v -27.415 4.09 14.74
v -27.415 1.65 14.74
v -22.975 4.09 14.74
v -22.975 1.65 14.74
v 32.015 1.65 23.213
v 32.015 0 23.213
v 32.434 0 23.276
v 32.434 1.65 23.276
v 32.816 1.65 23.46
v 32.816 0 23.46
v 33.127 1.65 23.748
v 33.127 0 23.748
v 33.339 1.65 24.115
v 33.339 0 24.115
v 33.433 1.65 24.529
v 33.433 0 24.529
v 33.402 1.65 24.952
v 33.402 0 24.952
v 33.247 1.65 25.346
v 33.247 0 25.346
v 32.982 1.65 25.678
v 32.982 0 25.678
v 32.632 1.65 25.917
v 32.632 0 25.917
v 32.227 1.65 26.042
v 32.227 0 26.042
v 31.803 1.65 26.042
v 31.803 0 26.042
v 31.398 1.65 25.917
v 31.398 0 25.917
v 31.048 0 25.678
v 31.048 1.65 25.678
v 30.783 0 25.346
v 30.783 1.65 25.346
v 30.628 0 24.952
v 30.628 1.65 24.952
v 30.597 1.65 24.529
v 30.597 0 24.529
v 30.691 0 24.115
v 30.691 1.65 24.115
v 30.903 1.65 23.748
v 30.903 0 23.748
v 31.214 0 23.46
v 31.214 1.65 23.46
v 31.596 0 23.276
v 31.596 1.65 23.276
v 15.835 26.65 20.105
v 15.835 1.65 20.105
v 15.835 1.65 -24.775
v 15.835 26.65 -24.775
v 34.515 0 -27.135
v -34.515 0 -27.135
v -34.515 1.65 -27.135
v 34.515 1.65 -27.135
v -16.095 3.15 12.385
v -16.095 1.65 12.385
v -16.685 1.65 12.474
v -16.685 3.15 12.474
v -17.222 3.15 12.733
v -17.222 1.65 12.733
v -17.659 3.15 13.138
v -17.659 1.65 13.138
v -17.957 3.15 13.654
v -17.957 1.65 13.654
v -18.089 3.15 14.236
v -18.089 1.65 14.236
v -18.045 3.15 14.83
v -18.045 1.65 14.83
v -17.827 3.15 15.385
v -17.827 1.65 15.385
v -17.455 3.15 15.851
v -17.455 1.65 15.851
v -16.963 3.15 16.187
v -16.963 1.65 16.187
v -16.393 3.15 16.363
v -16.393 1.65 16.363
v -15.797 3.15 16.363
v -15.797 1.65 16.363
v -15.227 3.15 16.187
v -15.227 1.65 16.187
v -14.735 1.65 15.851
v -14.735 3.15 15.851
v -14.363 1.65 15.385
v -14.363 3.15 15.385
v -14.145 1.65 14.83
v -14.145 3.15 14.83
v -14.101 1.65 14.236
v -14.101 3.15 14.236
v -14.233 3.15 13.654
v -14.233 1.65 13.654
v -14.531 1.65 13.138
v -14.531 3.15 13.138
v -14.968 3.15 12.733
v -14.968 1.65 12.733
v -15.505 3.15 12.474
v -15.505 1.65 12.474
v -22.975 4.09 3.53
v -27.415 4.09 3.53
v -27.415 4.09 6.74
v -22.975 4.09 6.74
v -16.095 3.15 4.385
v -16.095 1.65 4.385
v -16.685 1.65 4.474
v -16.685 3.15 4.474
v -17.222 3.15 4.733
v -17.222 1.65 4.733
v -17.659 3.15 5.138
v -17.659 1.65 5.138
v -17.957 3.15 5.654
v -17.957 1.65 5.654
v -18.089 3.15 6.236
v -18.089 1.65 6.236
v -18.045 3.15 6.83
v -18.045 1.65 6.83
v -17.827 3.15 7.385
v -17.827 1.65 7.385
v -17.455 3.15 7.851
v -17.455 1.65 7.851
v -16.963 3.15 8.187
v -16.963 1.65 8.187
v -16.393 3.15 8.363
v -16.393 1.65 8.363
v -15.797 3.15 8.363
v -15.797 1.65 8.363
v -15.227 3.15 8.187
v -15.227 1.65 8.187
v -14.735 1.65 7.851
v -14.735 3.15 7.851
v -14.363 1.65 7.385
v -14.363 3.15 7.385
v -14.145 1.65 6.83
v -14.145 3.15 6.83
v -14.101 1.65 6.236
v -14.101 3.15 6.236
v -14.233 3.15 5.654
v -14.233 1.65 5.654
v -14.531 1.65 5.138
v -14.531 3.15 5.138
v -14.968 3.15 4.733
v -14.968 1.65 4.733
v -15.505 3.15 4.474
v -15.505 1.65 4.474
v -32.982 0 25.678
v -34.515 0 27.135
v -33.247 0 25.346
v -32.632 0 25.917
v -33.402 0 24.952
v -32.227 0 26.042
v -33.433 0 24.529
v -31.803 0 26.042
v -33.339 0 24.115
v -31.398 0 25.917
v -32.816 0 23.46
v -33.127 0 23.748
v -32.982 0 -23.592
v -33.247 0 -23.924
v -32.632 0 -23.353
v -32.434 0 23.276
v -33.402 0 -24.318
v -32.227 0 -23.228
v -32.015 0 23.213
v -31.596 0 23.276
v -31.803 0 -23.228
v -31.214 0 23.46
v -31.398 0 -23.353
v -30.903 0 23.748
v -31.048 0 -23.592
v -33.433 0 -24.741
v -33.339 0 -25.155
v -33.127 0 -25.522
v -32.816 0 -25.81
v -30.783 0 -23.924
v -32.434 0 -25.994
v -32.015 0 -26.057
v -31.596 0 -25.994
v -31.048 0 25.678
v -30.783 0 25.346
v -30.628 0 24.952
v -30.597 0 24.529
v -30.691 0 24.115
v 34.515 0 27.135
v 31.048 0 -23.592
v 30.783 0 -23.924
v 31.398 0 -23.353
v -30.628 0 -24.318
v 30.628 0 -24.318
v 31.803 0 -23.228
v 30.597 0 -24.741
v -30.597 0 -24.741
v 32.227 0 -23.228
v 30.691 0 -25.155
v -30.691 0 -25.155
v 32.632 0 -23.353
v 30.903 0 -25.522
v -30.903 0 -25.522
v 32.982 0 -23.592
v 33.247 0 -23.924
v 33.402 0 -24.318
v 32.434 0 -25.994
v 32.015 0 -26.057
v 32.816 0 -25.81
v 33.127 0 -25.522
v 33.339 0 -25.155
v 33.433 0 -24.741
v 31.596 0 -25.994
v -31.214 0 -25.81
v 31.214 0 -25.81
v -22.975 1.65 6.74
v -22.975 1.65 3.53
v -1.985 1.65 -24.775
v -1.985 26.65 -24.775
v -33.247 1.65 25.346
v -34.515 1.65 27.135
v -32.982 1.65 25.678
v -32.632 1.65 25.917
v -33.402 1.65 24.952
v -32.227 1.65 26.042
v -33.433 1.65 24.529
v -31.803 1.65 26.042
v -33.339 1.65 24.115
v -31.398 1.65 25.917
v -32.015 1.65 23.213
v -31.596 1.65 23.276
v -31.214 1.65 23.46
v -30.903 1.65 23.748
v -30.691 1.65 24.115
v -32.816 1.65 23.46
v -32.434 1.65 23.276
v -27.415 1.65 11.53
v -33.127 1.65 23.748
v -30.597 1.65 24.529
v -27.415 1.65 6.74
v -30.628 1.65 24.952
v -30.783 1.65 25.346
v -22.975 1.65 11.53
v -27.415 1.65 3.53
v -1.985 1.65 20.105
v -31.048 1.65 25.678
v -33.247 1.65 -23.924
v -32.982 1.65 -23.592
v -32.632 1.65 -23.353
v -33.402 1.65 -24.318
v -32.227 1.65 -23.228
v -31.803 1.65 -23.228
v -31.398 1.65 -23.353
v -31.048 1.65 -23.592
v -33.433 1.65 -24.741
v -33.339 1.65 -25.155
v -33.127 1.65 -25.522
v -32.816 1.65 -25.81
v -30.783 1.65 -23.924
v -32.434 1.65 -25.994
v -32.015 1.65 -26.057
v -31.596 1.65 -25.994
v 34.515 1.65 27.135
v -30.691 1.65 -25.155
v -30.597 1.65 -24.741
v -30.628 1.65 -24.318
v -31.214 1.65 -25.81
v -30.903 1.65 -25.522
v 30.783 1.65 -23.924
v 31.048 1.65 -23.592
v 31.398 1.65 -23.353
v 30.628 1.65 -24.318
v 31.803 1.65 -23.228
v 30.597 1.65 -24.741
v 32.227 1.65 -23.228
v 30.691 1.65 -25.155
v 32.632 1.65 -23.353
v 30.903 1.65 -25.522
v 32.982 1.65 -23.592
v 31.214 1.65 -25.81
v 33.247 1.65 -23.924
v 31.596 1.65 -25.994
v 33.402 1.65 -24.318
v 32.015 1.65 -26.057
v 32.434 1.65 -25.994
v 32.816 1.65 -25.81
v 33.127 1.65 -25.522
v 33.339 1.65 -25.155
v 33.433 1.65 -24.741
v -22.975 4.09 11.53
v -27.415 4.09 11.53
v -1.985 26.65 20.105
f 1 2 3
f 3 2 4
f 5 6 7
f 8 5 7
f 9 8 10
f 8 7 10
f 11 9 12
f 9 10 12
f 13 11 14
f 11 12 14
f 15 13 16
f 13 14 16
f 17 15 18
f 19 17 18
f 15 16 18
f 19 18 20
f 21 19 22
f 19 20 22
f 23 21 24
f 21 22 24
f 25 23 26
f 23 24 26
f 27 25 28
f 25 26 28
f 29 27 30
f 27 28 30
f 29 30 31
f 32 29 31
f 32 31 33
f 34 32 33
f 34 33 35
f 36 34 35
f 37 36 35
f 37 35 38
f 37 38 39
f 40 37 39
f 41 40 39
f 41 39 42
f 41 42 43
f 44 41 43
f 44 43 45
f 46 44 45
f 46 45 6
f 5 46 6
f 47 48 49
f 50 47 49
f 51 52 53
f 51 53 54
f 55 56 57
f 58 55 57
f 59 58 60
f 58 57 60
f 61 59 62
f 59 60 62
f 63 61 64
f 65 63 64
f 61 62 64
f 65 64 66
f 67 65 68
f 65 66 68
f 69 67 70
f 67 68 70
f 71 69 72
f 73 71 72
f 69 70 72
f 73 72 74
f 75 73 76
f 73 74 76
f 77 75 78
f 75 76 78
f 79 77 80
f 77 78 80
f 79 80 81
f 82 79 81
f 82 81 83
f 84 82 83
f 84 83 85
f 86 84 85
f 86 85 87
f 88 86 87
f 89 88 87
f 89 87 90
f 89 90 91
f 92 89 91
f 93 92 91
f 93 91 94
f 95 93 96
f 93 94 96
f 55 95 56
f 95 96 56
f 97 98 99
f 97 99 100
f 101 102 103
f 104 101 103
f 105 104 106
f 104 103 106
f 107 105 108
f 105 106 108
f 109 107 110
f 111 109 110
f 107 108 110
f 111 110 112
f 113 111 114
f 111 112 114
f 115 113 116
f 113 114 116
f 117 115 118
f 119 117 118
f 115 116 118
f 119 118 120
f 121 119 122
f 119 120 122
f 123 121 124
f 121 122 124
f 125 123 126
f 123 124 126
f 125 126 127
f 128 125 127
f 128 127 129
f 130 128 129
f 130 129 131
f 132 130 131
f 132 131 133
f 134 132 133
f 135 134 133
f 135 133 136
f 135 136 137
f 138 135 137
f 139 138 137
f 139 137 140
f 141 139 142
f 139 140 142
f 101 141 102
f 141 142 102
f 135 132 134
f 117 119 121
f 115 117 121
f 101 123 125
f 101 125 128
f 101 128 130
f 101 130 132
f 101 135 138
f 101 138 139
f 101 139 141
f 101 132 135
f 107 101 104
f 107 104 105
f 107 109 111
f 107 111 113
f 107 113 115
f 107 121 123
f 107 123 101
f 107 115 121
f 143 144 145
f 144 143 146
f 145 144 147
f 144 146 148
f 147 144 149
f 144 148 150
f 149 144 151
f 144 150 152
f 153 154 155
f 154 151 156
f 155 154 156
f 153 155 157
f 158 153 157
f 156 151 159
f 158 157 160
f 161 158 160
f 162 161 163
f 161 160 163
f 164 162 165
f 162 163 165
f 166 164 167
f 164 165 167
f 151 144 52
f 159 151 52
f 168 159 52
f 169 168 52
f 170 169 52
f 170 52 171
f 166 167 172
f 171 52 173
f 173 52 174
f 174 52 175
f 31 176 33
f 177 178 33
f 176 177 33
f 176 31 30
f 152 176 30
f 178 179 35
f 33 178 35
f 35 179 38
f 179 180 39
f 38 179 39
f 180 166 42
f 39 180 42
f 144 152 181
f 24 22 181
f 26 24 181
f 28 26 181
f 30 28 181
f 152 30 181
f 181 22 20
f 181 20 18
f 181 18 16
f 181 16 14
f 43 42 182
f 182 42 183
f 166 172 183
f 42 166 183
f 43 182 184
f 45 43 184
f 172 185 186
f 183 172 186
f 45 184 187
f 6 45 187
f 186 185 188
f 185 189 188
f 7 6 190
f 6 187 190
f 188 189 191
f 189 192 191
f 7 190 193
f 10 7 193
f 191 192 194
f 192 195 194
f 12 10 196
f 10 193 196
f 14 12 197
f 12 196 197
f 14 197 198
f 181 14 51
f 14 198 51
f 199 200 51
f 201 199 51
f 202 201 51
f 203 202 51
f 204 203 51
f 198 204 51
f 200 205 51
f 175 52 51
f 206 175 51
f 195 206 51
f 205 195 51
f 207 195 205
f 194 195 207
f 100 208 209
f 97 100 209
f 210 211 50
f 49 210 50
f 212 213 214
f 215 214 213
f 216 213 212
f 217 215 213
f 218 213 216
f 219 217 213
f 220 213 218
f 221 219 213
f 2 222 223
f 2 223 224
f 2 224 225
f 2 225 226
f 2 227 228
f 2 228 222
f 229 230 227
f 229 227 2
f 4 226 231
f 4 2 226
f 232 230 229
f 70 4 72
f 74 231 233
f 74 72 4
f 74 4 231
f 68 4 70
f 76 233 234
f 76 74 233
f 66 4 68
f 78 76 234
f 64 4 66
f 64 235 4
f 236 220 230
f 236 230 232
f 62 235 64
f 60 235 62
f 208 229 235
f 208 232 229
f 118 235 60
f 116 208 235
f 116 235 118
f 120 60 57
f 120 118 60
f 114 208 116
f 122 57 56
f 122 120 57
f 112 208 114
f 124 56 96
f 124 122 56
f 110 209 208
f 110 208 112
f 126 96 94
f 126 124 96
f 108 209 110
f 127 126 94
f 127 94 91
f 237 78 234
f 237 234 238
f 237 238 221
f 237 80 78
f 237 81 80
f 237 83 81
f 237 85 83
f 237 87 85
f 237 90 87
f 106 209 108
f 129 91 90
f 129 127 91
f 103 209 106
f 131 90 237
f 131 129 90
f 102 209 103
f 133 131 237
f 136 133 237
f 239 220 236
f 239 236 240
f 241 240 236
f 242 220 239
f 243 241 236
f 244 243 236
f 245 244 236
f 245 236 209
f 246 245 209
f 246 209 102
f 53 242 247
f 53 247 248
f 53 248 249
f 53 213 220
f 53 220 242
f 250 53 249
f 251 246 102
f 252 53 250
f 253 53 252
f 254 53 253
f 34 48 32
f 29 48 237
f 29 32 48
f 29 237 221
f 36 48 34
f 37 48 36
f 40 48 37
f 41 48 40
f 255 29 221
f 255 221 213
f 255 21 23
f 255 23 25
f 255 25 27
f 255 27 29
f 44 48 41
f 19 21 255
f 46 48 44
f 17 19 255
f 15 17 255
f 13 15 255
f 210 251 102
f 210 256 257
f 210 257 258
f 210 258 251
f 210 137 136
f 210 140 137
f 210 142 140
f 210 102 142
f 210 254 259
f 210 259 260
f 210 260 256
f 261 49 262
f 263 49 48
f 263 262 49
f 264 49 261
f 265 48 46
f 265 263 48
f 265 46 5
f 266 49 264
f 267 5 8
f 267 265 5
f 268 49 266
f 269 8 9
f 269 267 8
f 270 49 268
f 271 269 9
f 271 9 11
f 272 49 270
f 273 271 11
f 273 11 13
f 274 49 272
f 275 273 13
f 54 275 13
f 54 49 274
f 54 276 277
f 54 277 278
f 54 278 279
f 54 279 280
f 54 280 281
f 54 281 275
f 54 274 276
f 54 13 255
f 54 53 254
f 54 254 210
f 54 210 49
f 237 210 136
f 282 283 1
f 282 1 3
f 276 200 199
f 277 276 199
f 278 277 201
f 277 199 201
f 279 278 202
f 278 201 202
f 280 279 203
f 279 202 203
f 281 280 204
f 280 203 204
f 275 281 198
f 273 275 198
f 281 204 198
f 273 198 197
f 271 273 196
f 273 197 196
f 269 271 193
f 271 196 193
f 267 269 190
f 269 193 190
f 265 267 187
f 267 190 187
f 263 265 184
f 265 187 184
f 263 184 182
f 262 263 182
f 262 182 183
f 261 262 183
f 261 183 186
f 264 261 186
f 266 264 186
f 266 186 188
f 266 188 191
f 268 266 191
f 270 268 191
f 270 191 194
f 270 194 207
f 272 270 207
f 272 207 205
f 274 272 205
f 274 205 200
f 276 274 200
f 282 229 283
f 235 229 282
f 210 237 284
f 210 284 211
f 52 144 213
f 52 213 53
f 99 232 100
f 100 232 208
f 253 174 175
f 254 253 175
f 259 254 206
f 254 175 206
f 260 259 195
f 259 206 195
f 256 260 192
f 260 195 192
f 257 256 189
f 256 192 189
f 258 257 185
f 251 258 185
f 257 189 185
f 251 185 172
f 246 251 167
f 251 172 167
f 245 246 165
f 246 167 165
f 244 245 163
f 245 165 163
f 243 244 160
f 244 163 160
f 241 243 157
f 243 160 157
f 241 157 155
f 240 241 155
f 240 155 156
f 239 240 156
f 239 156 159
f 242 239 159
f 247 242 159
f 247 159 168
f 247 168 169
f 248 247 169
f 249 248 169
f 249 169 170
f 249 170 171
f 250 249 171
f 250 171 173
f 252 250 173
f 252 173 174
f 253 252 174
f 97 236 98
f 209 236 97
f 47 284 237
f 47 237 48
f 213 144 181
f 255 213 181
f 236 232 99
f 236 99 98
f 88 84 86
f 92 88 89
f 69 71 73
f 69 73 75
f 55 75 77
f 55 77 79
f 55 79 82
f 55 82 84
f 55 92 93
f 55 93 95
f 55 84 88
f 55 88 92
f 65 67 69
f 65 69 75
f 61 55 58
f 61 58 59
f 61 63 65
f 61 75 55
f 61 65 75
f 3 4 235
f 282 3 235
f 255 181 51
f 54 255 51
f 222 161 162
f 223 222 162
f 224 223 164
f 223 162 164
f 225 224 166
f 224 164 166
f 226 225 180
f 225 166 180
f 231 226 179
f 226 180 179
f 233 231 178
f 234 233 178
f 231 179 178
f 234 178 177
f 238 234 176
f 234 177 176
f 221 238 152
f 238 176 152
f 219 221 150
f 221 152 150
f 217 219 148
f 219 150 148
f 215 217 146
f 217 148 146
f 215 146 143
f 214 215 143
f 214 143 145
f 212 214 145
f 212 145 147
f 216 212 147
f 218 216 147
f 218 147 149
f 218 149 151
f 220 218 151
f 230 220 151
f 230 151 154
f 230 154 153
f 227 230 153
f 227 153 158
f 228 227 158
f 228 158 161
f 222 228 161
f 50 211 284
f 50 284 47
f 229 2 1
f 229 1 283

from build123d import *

# Parameters (mm, degrees)
SKETCH1_W             = 69.03
SKETCH1_H             = 54.27
BOSS_EXTRUDE1_DEPTH   = 1.65
SKETCH2_R             = 2
BOSS_EXTRUDE2_DEPTH   = 1.5
SKETCH3_W             = 4.44
SKETCH3_H             = 3.21
BOSS_EXTRUDE3_DEPTH   = 2.44
SKETCH4_W             = 17.82
SKETCH4_H             = 44.88
BOSS_EXTRUDE4_DEPTH   = 25
F_4_CLEARANCE_HOLE1_D = 2.8448


with BuildPart() as part:
    # Sketch1 → Boss-Extrude1 (new body)
    with BuildSketch(Plane(origin=(0, 0, 0), x_dir=(1, 0, 0), z_dir=(0, 1, 0))):
        Rectangle(SKETCH1_W, SKETCH1_H)
    extrude(amount=BOSS_EXTRUDE1_DEPTH)

    # Sketch2 → Boss-Extrude2 (add)
    with BuildSketch(Plane(origin=(0, 1.65, 0), x_dir=(1, 0, 0), z_dir=(0, 1, 0))):
        with Locations(Location((-16.095, -14.385, 0), (0, 0, 90))):
            Circle(SKETCH2_R)
        with Locations(Location((-16.095, -6.385, 0), (0, 0, 90))):
            Circle(SKETCH2_R)
    extrude(amount=BOSS_EXTRUDE2_DEPTH)

    # Sketch3 → Boss-Extrude3 (add)
    with BuildSketch(Plane(origin=(0, 1.65, 0), x_dir=(1, 0, 0), z_dir=(0, 1, 0))):
        with Locations((-25.195, -13.135)):
            Rectangle(SKETCH3_W, SKETCH3_H)
        with Locations((-25.195, -5.135)):
            Rectangle(SKETCH3_W, SKETCH3_H)
    extrude(amount=BOSS_EXTRUDE3_DEPTH)

    # Sketch4 → Boss-Extrude4 (add)
    with BuildSketch(Plane(origin=(0, 1.65, 0), x_dir=(1, 0, 0), z_dir=(0, 1, 0))):
        with Locations((6.925, 2.335)):
            Rectangle(SKETCH4_W, SKETCH4_H)
    extrude(amount=BOSS_EXTRUDE4_DEPTH)

    # #4 Clearance Hole1 (through all)
    with Locations(Plane(origin=(18.660321972, 1.65, 81.830440854), x_dir=(0, 0, 1), z_dir=(0, 1, 0))):
        with Locations((-106.465440854, -50.675321972), (-57.195440854, -50.675321972), (-57.195440854, 13.354678028), (-106.465440854, 13.354678028)):
            Hole(F_4_CLEARANCE_HOLE1_D / 2)


solid = part.part
